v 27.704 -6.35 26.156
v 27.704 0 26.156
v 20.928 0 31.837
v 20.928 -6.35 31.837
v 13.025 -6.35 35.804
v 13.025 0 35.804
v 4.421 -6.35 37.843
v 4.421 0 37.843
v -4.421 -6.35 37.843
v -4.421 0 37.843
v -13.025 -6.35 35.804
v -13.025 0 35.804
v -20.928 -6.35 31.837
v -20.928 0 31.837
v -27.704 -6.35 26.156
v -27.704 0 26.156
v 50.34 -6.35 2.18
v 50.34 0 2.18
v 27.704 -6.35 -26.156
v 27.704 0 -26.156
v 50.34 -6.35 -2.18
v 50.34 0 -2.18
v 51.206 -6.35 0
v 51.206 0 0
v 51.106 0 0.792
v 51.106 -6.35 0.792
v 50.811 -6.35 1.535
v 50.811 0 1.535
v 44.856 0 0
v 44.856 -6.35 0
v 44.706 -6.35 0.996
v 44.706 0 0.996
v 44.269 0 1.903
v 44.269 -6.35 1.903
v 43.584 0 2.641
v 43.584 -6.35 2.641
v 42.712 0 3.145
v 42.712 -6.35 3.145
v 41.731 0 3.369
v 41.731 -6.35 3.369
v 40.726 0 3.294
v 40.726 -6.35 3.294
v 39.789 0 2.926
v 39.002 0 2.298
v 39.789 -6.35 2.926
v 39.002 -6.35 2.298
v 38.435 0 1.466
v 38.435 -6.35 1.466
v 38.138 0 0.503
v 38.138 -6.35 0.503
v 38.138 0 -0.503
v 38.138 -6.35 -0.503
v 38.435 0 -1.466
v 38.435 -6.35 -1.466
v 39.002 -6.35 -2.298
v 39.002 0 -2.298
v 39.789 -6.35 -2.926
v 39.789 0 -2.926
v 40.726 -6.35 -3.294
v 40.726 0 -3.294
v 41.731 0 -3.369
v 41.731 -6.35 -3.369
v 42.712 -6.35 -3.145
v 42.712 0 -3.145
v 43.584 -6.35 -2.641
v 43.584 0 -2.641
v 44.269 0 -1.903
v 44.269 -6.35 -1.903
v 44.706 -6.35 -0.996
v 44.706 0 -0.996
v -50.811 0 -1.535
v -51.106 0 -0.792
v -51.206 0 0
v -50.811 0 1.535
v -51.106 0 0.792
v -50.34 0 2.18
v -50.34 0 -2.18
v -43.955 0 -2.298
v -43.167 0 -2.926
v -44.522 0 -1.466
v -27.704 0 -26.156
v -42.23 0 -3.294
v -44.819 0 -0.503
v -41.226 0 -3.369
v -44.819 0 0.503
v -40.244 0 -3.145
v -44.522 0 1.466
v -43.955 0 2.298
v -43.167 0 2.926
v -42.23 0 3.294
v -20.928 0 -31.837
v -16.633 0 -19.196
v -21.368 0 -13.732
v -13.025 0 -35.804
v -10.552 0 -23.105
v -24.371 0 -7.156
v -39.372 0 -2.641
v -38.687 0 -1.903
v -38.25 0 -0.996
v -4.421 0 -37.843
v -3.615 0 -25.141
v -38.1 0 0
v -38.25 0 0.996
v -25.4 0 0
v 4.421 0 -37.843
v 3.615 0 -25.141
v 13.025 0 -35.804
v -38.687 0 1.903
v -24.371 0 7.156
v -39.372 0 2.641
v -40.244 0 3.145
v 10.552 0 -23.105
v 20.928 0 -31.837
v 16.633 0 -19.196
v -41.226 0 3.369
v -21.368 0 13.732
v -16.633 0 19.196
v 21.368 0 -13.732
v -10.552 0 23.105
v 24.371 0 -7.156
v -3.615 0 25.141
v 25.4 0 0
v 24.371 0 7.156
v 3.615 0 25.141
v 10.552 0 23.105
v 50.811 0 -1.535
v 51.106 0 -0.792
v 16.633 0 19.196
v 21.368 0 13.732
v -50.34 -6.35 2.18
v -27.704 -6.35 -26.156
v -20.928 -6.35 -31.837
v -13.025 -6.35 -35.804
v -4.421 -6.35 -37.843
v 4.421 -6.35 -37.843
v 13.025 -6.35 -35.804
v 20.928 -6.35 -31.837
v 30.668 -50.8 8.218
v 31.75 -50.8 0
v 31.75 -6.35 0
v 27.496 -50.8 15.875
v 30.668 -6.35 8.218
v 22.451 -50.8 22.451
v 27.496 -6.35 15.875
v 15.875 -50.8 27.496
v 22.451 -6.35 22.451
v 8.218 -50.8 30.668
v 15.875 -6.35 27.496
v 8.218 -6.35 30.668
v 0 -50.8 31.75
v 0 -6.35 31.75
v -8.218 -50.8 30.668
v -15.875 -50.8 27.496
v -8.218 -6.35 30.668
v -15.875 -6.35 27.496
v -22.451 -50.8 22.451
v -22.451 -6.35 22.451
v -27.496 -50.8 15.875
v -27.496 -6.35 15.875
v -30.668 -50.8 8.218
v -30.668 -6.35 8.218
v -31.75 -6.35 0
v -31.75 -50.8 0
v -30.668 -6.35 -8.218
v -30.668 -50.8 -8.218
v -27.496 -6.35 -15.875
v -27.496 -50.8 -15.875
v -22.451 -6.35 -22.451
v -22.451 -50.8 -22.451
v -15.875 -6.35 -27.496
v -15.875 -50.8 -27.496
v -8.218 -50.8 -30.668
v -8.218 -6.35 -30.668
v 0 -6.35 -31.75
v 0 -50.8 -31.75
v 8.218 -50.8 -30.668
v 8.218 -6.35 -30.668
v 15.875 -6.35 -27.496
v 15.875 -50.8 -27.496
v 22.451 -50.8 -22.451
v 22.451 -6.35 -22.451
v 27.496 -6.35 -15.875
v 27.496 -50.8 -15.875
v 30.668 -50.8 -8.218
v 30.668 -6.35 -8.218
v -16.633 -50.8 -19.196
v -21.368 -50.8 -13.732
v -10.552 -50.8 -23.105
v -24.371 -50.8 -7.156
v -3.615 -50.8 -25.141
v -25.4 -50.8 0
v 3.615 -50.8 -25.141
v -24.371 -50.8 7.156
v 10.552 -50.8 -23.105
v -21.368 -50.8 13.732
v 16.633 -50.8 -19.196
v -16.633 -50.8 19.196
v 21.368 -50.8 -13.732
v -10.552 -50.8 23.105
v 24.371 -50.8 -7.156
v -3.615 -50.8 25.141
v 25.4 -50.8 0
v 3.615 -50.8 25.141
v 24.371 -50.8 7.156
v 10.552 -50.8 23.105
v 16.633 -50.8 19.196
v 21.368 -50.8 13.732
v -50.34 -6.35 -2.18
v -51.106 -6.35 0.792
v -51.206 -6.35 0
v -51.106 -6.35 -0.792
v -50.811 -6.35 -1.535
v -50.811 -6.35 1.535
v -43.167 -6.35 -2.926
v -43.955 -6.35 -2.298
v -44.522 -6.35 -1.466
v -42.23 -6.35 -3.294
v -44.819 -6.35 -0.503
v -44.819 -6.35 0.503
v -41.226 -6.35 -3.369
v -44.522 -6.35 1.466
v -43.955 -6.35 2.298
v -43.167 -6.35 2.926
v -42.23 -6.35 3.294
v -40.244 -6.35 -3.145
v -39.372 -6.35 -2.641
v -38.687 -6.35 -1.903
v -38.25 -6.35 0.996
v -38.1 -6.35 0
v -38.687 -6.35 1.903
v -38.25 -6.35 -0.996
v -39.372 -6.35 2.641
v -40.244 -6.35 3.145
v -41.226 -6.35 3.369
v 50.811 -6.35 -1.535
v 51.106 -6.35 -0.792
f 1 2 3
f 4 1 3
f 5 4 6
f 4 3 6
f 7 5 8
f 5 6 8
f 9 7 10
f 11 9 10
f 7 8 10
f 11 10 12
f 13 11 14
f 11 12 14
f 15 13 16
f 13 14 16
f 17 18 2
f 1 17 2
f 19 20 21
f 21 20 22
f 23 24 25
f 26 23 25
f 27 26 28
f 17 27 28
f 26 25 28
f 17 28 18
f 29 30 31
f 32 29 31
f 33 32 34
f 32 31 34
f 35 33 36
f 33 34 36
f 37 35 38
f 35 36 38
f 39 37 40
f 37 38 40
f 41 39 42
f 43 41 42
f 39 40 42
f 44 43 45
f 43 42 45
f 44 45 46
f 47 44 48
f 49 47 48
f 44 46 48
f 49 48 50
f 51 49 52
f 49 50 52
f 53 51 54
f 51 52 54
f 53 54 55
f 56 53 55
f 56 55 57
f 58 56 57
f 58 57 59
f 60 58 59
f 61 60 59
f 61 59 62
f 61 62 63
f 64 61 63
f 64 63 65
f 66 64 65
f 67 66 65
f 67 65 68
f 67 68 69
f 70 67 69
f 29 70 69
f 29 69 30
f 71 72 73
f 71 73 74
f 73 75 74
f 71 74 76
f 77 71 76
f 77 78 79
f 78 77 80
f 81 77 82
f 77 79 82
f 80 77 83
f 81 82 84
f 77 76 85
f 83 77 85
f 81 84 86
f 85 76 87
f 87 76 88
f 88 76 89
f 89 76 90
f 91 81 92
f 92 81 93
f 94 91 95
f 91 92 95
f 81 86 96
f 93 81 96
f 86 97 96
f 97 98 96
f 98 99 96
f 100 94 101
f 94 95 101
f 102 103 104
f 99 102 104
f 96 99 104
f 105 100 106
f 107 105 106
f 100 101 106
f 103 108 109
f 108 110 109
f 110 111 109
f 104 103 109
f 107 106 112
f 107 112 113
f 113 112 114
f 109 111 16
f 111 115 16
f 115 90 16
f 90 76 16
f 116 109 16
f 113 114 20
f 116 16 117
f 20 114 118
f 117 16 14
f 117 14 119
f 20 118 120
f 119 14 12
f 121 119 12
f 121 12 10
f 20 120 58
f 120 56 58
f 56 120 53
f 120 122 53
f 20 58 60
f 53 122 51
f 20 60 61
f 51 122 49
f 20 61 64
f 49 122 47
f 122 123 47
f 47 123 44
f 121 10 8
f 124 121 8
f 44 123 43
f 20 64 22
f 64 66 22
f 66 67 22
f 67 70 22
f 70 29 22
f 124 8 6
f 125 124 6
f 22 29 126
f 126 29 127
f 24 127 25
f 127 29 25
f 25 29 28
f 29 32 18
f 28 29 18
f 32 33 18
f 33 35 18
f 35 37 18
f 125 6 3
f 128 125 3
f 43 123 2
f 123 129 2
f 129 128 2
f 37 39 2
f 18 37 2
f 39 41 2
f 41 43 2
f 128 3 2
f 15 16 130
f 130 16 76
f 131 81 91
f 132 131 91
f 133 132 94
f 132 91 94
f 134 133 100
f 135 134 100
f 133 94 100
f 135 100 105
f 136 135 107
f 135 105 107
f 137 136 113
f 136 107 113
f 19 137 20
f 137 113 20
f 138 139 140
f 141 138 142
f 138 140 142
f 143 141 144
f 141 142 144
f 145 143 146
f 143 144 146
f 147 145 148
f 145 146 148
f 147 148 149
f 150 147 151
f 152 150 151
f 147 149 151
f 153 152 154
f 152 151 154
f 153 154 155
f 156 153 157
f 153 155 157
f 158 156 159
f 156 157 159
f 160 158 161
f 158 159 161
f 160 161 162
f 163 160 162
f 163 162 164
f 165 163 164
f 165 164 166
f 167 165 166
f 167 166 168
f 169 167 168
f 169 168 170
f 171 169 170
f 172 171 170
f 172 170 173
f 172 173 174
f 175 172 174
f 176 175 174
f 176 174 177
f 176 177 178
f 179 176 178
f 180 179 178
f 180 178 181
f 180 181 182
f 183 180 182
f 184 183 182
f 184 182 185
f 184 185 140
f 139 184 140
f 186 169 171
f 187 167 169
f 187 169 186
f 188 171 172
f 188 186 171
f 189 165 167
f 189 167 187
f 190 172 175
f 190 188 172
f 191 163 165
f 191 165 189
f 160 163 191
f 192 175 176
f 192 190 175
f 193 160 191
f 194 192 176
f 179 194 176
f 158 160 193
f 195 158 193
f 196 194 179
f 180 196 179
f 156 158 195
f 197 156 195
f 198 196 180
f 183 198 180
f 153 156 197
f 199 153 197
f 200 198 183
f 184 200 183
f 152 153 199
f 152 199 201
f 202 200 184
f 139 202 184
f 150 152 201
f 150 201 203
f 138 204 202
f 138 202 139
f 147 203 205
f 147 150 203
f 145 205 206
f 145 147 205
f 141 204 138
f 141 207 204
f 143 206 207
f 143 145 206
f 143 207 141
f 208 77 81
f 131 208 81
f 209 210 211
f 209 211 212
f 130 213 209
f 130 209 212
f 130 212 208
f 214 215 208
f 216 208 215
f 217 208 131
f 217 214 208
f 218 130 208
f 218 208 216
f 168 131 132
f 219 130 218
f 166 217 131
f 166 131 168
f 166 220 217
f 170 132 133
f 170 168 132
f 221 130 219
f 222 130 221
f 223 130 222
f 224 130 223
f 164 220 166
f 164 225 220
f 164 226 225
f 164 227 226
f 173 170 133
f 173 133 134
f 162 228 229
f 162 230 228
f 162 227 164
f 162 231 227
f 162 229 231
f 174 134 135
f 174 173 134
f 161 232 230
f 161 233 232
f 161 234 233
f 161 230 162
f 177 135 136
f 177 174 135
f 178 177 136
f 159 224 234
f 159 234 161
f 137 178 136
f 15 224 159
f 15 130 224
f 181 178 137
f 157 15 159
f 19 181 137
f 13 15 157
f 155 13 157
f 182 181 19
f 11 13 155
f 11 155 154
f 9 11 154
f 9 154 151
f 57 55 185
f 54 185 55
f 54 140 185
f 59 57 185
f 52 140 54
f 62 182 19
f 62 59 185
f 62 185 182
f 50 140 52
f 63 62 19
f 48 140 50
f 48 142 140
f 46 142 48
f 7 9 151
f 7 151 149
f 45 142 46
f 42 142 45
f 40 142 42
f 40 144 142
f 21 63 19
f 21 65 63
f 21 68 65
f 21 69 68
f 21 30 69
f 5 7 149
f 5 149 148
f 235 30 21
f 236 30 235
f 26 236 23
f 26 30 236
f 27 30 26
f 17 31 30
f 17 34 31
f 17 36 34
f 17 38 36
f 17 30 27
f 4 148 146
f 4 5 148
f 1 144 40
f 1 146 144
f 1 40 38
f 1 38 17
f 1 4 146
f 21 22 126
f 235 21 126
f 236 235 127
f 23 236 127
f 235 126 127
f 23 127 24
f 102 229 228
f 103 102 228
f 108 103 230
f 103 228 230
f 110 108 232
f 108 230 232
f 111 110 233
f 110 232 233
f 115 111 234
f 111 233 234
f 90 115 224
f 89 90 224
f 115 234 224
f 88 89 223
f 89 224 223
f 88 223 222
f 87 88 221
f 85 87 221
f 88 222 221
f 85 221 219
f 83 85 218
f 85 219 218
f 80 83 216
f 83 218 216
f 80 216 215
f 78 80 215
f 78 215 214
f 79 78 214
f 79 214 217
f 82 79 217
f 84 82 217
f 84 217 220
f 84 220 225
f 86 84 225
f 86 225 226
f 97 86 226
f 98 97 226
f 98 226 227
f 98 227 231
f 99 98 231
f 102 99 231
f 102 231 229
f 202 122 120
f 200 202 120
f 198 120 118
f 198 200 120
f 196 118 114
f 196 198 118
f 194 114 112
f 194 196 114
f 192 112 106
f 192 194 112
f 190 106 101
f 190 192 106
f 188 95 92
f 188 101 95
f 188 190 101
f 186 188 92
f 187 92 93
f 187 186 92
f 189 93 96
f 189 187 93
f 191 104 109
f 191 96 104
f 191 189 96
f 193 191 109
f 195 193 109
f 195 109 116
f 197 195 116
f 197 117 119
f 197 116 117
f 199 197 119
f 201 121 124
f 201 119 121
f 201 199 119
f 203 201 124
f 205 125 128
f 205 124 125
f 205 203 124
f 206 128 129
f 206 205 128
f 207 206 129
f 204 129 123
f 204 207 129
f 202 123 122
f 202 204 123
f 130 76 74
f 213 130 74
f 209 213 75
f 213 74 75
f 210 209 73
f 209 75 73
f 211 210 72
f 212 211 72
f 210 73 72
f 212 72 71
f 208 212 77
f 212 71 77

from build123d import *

# Parameters (mm, degrees)
F1_DEPTH = 6.35
F2_R     = 31.75
F2_R_2   = 25.4
F3_DEPTH = 50.8
F5_DEPTH = 127
F7_R     = 3.3782
F8_DEPTH = 127


with BuildPart() as f1:
    # F0 (on Front) → F1 (new body)
    with BuildSketch(Plane.XZ):
        with BuildLine():
            ThreePointArc((27.703595981, -26.1557024322), (35.4056281322, -14.0730770112), (38.1, 0))
            ThreePointArc((38.1, 0), (35.4056281322, 14.0730770112), (27.703595981, 26.1557024322))
            ThreePointArc((27.703595981, 26.1557024322), (0, 38.1), (-27.703595981, 26.1557024322))
            ThreePointArc((-27.703595981, 26.1557024322), (-38.1, 0), (-27.703595981, -26.1557024322))
            ThreePointArc((-27.703595981, -26.1557024322), (0, -38.1), (27.703595981, -26.1557024322))
        make_face()
        with BuildLine():
            ThreePointArc((27.703595981, 26.1557024322), (35.4056281322, 14.0730770112), (38.1, 0))
            ThreePointArc((38.1, 0), (35.4056281322, -14.0730770112), (27.703595981, -26.1557024322))
            Line((27.703595981, -26.1557024322), (50.3400329984, -2.1796418694))
            ThreePointArc((50.3400329984, -2.1796418694), (46.8586435824, -2.950469011), (44.8564, 0))
            ThreePointArc((44.8564, 0), (46.8586435824, 2.950469011), (50.3400329984, 2.1796418694))
            Line((50.3400329984, 2.1796418694), (27.703595981, 26.1557024322))
        make_face()
        with BuildLine():
            ThreePointArc((-27.703595981, -26.1557024322), (-38.1, 0), (-27.703595981, 26.1557024322))
            Line((-27.703595981, 26.1557024322), (-50.3400329984, 2.1796418694))
            ThreePointArc((-50.3400329984, 2.1796418694), (-46.8586435824, 2.950469011), (-44.8564, 0))
            ThreePointArc((-44.8564, 0), (-46.8586435824, -2.950469011), (-50.3400329984, -2.1796418694))
            Line((-50.3400329984, -2.1796418694), (-27.703595981, -26.1557024322))
        make_face()
        with BuildLine():
            ThreePointArc((51.2064, 0), (50.981869011, 1.1727564176), (50.3400329984, 2.1796418694))
            ThreePointArc((50.3400329984, 2.1796418694), (46.8586435824, 2.950469011), (44.8564, 0))
            ThreePointArc((44.8564, 0), (46.8586435824, -2.950469011), (50.3400329984, -2.1796418694))
            ThreePointArc((50.3400329984, -2.1796418694), (50.981869011, -1.1727564176), (51.2064, 0))
        make_face()
        with BuildLine():
            ThreePointArc((-44.8564, 0), (-46.8586435824, 2.950469011), (-50.3400329984, 2.1796418694))
            ThreePointArc((-50.3400329984, 2.1796418694), (-51.2064, 0), (-50.3400329984, -2.1796418694))
            ThreePointArc((-50.3400329984, -2.1796418694), (-46.8586435824, -2.950469011), (-44.8564, 0))
        make_face()
    extrude(amount=F1_DEPTH)

    # F2 (on Front) → F3 (join)
    with BuildSketch(Plane.XZ):
        Circle(F2_R)
        Circle(F2_R_2, mode=Mode.SUBTRACT)
    extrude(amount=F3_DEPTH)

    # F5 (cut): a face of the model
    f5_faces = [f1.faces().sort_by_distance(p)[0] for p in [
        (0, -6.35, 0),
    ]]
    extrude(f5_faces, amount=-F5_DEPTH, mode=Mode.SUBTRACT)

    # F7 (on offset) → F8 (cut)
    with BuildSketch(Plane.XZ.offset(127)):
        with Locations((-41.4782, 0)):
            Circle(F7_R)
        with Locations((41.4782, 0)):
            Circle(F7_R)
    extrude(amount=-F8_DEPTH, mode=Mode.SUBTRACT)


solid = f1.part
